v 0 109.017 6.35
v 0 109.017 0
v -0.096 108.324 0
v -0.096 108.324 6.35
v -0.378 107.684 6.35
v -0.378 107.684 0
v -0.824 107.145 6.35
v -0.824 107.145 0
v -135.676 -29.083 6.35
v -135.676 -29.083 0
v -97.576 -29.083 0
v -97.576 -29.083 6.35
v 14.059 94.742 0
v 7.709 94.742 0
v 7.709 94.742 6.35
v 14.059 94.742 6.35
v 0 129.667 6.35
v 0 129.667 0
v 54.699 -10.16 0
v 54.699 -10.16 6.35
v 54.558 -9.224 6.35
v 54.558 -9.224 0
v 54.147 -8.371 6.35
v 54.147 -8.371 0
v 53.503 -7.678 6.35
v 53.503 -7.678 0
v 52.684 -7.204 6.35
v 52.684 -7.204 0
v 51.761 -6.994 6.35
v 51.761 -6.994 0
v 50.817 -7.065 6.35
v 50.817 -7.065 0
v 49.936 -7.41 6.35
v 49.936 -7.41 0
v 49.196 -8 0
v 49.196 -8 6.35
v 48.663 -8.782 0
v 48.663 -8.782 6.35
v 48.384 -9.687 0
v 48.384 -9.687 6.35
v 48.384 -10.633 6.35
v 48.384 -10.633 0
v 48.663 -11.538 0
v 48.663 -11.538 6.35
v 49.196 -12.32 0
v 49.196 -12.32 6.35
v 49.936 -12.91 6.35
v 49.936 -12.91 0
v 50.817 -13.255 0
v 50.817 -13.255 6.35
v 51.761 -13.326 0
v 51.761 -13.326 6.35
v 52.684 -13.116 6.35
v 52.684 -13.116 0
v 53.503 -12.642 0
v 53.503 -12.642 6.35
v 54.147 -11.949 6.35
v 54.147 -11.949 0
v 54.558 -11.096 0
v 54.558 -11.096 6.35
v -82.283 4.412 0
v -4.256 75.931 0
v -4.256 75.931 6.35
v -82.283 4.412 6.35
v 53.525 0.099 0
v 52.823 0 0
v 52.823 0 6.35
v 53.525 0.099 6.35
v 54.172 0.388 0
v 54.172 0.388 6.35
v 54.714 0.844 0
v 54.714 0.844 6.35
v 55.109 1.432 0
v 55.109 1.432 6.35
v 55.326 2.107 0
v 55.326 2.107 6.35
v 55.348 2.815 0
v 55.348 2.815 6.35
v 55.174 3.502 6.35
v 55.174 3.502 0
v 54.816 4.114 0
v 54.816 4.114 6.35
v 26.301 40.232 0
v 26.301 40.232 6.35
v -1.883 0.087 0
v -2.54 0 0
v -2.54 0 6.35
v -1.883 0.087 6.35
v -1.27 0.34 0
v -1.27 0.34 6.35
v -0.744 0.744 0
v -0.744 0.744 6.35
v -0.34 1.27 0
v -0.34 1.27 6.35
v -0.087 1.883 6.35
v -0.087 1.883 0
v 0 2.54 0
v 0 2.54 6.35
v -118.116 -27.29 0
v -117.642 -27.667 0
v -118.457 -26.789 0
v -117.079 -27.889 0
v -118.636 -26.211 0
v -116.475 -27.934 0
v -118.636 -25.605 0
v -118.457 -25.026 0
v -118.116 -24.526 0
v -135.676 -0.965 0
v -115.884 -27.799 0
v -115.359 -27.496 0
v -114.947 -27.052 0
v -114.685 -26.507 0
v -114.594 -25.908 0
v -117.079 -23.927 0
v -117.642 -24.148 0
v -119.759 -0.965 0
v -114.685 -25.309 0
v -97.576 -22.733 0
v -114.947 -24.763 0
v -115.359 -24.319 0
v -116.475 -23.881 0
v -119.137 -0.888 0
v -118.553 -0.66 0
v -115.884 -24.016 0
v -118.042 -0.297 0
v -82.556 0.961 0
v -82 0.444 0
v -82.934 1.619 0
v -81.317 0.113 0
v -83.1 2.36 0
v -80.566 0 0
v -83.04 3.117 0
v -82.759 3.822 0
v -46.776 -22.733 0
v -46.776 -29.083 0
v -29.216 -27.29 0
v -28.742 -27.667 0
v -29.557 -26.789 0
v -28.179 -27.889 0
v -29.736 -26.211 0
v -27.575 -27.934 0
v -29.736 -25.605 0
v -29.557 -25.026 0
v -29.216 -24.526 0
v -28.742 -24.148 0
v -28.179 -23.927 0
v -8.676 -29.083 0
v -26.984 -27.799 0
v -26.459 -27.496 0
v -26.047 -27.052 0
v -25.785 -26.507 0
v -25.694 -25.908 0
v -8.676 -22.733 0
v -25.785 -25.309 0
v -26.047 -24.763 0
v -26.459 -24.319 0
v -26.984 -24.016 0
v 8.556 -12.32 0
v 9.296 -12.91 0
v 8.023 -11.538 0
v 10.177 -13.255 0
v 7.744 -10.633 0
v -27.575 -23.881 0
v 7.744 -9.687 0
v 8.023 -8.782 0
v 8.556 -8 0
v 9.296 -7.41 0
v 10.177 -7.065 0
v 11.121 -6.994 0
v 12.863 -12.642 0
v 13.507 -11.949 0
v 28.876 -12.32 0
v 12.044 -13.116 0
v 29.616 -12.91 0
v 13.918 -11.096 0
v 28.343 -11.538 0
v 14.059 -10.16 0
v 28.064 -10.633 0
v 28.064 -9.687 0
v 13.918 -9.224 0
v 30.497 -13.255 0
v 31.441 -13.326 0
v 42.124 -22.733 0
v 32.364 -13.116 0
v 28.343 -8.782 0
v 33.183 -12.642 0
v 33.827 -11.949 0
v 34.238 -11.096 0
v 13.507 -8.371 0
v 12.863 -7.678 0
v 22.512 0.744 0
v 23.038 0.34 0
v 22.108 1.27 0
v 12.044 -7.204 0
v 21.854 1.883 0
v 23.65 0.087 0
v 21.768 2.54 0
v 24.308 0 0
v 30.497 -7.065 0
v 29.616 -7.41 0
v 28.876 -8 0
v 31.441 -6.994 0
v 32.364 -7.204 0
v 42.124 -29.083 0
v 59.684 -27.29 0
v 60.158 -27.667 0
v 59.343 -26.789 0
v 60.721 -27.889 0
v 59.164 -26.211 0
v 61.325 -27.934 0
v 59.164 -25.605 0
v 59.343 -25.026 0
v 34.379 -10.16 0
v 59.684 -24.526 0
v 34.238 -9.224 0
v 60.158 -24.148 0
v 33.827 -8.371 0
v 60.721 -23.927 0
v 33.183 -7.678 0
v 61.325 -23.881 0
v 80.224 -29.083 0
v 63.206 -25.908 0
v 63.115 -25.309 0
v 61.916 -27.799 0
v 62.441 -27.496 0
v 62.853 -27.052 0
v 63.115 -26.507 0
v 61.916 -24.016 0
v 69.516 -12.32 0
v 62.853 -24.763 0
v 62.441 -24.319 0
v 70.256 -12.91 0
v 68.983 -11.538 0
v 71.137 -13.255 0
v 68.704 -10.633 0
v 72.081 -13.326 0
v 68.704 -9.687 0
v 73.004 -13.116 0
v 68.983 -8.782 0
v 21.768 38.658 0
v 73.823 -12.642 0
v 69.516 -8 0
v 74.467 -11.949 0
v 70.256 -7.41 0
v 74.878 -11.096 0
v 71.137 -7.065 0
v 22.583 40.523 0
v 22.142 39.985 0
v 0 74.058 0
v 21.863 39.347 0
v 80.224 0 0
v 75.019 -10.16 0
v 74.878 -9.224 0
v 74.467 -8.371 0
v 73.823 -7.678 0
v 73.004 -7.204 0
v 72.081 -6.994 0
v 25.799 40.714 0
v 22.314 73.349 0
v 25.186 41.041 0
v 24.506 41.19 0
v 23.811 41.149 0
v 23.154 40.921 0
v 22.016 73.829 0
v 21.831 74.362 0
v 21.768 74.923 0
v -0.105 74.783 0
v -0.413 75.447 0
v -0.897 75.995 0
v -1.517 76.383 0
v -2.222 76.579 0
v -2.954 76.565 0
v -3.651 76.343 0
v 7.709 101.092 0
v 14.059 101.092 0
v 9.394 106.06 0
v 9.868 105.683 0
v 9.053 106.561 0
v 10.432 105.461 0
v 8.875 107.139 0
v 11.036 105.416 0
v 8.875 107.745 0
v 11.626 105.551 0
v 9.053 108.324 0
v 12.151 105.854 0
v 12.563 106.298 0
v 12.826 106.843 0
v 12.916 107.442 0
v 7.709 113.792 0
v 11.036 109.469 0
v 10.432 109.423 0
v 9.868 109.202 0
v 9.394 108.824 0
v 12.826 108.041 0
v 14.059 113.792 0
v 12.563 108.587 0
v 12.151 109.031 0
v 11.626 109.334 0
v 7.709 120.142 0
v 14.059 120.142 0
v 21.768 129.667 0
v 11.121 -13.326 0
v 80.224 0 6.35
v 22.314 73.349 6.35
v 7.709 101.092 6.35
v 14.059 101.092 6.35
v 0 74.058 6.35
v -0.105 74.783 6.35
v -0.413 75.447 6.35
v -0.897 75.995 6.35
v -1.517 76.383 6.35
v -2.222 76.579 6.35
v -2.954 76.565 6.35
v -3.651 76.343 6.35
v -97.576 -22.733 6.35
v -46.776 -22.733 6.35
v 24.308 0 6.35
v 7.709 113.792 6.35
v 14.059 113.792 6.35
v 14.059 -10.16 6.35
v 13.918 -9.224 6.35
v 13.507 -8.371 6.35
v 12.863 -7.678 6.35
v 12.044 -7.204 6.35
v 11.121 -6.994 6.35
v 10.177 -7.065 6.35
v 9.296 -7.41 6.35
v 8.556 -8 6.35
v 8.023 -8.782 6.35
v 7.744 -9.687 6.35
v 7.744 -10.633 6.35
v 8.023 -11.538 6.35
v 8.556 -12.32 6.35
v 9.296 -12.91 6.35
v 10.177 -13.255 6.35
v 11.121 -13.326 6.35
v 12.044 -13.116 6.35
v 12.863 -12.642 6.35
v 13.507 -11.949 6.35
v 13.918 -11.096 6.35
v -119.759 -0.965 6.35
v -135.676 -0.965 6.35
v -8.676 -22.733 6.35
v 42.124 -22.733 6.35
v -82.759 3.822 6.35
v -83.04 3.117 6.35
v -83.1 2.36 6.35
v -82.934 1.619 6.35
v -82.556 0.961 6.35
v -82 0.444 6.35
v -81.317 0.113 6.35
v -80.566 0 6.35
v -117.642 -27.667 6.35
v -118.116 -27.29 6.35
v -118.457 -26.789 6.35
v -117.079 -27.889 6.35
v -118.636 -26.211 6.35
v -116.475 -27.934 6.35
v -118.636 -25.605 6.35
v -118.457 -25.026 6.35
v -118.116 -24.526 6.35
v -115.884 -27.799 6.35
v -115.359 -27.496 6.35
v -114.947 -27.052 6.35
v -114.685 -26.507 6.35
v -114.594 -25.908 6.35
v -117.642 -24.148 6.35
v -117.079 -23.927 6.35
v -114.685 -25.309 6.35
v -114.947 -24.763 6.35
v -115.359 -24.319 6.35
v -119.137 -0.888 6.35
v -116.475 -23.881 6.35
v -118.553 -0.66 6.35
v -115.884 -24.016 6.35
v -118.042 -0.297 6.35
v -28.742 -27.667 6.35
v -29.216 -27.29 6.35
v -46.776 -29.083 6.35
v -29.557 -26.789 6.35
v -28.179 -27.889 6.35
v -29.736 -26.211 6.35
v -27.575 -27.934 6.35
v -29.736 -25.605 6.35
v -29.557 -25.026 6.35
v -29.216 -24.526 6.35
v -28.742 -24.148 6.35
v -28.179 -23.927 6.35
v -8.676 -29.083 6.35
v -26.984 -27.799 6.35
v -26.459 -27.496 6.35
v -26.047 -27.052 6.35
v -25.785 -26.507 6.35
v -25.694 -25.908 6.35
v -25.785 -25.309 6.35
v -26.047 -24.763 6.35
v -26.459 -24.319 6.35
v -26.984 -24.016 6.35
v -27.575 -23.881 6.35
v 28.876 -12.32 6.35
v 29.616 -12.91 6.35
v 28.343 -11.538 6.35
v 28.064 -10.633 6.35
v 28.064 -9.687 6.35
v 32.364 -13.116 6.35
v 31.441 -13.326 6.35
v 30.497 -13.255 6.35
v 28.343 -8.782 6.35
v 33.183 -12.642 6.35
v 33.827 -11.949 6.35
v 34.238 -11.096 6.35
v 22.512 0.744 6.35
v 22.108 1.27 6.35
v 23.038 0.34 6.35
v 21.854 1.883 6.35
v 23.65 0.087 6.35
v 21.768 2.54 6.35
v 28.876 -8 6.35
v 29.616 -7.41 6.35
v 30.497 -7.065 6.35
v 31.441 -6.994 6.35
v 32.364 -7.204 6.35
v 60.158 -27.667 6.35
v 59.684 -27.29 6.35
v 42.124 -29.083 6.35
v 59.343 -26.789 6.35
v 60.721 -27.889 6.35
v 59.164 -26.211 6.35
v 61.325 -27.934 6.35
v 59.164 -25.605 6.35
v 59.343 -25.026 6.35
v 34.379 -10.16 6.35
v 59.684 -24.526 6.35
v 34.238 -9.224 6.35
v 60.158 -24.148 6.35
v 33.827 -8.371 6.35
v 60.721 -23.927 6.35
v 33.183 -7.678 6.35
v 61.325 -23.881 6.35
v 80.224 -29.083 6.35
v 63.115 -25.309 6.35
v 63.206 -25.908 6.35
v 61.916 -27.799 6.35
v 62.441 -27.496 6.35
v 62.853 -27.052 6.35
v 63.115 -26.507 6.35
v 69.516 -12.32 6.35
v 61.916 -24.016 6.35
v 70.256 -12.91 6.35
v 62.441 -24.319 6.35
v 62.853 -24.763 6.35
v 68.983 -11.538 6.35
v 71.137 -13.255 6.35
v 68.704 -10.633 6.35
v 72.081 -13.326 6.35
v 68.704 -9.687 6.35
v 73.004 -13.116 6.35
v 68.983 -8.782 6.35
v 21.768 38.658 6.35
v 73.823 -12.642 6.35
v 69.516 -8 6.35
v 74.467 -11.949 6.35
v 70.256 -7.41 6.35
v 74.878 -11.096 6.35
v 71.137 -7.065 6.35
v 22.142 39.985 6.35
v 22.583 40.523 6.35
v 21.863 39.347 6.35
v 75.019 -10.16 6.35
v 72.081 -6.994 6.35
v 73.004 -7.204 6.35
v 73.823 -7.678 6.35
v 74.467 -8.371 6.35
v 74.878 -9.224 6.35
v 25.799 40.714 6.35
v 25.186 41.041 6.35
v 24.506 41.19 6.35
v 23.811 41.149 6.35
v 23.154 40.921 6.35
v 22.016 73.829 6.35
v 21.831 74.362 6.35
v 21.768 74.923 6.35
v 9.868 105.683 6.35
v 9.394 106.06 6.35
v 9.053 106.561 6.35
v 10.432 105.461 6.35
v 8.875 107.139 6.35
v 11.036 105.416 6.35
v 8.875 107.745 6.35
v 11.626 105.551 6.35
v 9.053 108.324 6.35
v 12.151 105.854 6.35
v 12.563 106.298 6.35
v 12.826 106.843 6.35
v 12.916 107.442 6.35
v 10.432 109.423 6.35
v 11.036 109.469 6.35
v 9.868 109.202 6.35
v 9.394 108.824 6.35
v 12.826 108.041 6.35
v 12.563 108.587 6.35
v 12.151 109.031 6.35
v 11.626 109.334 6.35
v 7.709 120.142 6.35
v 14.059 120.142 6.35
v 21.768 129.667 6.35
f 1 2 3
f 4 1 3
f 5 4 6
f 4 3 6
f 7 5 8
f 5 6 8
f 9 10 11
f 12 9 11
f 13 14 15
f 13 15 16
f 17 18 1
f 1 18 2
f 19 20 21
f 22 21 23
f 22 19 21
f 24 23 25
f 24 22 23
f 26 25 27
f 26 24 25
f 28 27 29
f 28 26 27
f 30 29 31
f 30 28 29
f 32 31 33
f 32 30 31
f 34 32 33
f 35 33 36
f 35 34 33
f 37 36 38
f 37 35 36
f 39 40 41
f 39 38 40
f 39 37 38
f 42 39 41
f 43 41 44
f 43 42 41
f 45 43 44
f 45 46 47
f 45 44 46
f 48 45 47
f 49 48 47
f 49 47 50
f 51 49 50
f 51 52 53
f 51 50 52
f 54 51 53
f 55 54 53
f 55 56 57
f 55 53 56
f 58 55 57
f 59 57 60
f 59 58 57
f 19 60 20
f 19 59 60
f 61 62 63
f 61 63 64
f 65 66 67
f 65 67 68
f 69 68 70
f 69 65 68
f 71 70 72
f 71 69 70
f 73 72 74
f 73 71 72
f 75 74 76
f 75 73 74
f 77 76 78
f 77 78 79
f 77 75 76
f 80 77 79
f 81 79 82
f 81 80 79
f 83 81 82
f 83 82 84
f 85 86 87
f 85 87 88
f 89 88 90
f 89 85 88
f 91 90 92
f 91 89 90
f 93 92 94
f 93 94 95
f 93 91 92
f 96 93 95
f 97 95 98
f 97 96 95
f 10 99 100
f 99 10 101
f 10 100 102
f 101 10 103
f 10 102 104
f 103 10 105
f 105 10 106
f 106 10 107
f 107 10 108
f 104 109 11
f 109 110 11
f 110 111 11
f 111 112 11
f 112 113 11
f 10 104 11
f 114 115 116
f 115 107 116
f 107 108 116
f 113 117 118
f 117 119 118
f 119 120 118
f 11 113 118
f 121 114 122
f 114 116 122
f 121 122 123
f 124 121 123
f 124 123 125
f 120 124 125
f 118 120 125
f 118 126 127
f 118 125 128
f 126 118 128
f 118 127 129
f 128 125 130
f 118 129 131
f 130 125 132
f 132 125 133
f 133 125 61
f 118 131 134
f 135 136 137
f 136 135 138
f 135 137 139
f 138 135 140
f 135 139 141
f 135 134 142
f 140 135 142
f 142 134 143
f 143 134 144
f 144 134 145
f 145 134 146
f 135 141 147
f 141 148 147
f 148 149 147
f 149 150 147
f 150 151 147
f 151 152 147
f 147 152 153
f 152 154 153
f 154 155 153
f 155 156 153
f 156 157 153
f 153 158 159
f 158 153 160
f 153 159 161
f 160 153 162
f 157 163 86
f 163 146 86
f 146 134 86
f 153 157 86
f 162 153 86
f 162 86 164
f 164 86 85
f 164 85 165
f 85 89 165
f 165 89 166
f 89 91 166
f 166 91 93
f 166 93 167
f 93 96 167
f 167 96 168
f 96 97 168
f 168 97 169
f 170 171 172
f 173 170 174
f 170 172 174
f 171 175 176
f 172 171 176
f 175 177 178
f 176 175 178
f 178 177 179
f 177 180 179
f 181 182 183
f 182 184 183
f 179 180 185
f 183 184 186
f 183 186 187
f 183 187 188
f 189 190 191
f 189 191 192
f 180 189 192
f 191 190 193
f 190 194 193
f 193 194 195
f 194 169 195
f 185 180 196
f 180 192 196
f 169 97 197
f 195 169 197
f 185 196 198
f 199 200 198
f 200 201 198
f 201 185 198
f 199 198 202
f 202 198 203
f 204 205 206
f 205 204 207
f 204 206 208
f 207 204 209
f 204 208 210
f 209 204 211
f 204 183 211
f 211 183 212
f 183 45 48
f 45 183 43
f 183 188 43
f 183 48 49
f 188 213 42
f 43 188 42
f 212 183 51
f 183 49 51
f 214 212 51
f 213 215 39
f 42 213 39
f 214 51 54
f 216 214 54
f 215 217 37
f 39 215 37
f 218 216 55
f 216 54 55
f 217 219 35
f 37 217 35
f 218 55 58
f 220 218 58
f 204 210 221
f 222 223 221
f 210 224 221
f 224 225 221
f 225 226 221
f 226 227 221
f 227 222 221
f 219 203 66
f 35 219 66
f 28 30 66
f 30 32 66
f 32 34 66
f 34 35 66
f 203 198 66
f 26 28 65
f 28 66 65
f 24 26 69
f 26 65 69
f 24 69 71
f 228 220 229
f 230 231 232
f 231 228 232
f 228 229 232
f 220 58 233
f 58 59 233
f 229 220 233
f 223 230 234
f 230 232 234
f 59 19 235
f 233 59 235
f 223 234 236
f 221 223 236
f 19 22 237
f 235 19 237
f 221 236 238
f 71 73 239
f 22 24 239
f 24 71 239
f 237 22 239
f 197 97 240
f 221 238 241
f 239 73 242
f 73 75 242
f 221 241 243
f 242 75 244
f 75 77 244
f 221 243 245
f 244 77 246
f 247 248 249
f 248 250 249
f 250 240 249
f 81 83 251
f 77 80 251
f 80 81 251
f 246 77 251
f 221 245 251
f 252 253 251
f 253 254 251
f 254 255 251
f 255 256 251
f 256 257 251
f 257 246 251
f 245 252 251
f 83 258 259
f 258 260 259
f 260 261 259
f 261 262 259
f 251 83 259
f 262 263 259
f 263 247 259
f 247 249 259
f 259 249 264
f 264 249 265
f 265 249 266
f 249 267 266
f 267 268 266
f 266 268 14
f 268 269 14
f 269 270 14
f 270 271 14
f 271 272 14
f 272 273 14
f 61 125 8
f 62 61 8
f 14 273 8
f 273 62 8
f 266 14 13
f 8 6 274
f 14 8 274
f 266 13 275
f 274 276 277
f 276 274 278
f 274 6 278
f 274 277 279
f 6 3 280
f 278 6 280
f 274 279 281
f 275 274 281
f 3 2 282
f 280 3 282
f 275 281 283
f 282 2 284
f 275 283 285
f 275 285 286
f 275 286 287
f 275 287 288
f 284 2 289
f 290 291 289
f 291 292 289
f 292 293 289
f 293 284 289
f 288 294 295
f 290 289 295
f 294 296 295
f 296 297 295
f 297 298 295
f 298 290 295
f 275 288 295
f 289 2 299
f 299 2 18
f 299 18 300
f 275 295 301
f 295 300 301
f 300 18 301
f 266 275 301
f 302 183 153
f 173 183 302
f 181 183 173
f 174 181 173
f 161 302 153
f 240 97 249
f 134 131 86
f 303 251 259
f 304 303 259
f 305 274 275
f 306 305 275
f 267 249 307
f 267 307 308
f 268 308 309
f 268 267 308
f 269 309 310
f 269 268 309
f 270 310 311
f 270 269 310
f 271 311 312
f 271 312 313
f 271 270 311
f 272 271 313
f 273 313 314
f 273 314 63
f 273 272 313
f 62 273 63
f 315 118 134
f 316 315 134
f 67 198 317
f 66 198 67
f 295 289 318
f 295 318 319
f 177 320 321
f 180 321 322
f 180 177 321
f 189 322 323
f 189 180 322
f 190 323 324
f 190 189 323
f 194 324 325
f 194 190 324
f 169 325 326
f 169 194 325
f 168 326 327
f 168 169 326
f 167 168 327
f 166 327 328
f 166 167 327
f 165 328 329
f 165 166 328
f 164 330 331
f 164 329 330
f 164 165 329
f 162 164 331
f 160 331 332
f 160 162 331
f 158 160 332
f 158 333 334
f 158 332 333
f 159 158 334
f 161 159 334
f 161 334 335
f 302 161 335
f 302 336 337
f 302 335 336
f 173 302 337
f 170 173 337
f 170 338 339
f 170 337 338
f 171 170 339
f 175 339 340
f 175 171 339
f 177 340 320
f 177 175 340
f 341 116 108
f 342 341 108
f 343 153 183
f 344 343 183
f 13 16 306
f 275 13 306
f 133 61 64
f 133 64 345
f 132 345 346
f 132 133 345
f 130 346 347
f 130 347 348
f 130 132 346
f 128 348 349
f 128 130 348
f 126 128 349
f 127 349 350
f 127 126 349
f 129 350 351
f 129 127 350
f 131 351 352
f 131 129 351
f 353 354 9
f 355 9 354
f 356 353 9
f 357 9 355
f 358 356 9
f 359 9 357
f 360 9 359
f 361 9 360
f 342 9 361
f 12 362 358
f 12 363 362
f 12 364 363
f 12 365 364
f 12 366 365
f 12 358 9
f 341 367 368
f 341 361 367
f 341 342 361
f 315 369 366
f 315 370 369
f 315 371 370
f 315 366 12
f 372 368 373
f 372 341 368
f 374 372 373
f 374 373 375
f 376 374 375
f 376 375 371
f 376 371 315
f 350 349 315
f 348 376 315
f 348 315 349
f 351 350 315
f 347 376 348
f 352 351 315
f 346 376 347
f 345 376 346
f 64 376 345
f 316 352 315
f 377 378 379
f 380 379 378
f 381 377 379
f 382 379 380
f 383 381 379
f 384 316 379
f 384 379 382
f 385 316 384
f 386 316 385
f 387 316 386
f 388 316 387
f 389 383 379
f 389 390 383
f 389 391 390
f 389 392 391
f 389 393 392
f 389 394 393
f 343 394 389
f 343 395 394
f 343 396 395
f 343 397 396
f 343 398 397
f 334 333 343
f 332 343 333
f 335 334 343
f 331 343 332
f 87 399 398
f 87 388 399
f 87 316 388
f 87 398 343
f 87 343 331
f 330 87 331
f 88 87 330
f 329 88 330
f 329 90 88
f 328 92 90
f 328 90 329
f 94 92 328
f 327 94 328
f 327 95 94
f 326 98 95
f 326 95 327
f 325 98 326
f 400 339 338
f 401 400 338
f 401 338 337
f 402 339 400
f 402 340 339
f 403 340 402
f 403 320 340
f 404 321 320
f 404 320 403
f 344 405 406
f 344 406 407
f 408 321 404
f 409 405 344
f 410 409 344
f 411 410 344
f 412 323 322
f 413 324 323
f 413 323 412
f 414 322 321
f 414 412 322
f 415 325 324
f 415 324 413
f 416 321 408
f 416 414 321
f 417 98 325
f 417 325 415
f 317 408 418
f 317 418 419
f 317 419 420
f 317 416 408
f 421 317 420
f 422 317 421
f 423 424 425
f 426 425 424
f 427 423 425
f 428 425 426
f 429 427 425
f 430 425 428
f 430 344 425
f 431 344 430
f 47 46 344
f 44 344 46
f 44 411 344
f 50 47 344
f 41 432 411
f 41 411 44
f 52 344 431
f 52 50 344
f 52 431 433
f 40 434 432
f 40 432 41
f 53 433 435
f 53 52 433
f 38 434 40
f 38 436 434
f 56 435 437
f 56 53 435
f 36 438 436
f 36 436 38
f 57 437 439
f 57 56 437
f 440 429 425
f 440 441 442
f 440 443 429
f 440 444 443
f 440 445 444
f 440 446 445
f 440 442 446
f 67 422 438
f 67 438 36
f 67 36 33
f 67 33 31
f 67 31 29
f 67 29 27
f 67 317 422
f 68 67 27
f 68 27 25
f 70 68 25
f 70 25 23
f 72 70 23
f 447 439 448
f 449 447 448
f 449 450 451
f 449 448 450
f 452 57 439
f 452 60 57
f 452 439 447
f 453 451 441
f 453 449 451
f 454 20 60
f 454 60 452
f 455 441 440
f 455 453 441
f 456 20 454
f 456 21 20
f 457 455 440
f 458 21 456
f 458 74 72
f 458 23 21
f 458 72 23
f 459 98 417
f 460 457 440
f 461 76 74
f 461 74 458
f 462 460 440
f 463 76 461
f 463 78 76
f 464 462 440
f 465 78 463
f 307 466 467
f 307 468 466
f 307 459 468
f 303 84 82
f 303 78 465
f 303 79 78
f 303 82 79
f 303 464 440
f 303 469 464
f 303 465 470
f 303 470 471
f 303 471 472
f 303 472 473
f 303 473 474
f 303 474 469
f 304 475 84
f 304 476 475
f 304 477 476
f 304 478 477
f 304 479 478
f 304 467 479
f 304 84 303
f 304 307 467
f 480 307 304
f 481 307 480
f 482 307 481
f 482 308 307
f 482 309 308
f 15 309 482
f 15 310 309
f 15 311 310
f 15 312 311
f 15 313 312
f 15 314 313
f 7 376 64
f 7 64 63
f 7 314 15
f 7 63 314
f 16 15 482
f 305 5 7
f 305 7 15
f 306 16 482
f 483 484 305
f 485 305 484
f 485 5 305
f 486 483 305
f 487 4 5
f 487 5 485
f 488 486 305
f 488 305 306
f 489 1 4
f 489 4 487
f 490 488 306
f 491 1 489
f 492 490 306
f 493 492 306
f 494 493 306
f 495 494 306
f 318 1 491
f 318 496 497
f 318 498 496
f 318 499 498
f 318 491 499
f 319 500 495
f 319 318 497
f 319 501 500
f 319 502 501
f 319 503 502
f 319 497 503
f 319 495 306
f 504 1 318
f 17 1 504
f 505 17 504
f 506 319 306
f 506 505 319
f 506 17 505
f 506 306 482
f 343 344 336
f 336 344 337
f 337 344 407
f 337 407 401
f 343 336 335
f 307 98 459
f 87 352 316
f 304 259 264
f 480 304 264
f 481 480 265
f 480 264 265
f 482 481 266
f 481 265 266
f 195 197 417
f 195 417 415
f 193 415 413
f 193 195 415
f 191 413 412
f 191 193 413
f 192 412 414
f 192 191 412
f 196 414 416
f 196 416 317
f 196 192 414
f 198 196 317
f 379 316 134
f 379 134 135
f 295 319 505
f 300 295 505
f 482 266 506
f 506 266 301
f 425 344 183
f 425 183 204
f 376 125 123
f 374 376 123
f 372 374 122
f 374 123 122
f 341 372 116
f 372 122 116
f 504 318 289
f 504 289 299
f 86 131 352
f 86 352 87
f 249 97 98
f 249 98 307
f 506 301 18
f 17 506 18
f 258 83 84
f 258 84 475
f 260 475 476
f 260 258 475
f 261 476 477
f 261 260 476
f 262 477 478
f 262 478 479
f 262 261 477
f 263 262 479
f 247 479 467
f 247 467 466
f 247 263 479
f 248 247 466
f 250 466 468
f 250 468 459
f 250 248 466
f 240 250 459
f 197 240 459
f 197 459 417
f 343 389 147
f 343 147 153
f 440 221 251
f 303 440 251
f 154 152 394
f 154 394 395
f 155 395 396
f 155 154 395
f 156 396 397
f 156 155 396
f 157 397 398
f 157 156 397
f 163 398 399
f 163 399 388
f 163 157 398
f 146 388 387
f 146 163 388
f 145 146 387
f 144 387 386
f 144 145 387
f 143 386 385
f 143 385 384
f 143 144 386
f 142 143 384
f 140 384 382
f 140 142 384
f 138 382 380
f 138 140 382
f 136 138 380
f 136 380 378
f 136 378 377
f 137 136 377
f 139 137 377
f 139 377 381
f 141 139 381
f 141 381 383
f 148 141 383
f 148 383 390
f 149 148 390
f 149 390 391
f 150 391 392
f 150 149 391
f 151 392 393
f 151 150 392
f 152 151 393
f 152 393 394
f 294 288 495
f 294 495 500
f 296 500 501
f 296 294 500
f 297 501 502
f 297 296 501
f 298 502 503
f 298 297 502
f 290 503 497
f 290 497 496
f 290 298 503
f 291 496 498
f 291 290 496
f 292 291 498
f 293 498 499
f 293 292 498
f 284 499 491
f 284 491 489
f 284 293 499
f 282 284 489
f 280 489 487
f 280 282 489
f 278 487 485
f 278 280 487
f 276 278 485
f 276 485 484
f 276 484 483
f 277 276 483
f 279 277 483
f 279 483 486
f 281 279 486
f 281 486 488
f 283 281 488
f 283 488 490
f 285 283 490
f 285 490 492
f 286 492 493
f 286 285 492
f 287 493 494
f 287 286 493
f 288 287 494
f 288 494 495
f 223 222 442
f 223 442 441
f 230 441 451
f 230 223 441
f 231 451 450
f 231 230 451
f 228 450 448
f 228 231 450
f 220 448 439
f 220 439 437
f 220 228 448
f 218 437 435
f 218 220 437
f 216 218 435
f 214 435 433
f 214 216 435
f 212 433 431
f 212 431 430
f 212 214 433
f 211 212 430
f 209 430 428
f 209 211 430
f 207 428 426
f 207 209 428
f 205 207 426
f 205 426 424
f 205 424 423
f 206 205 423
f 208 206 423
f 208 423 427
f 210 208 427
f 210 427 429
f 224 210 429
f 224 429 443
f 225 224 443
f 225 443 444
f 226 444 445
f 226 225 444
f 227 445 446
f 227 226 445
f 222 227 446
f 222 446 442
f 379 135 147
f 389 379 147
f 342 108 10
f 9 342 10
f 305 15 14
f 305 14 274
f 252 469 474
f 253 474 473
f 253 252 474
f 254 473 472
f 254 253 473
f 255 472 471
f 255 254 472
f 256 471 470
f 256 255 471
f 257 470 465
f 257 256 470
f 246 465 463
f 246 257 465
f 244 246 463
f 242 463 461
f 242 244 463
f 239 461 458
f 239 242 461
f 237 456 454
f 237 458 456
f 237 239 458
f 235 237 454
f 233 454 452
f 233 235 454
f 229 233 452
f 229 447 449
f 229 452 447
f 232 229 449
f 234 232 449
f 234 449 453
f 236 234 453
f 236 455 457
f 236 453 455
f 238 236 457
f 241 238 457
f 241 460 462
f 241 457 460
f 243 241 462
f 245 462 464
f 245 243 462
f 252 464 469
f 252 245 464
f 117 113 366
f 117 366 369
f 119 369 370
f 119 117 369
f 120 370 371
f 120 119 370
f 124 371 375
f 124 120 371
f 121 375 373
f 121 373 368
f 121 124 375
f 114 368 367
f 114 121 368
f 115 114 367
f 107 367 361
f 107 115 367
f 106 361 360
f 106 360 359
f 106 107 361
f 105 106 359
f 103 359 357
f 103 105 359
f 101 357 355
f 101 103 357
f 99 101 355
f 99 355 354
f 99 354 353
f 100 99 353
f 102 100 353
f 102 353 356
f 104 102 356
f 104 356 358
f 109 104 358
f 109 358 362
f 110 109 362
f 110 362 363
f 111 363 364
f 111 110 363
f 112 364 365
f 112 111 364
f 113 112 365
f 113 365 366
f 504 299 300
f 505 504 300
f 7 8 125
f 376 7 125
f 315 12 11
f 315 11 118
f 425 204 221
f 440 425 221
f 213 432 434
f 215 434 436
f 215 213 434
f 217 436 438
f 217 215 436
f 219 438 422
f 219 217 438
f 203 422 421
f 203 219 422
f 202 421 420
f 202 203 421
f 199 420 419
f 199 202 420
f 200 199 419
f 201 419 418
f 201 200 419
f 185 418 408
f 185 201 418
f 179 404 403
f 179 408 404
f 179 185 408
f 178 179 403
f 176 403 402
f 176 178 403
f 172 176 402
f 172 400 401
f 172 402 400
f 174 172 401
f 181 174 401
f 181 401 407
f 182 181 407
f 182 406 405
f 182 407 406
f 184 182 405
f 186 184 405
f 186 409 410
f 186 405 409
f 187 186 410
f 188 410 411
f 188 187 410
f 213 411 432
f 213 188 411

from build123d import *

# Parameters (mm, degrees)
SKETCH1_R           = 2.032
SKETCH1_W           = 6.35
SKETCH1_H           = 6.35
BOSS_EXTRUDE2_DEPTH = 6.35
CUT_EXTRUDE1_START  = -6.35
SKETCH3_R           = 3.175
CUT_EXTRUDE1_DEPTH  = 195.131829617


with BuildPart() as part:
    # Sketch1 → Boss-Extrude2 (new body)
    with BuildSketch(Plane.XY):
        with BuildLine():
            Line((21.7678, 129.667339502), (0, 129.667339502))
            Line((0, 129.667339502), (0, 109.016949915))
            ThreePointArc((0, 109.016949915), (-0.215035851, 107.994139226), (-0.823733627, 107.1445104))
            Line((-0.823733627, 107.1445104), (-118.042304389, -0.297300013))
            ThreePointArc((-118.042304389, -0.297300013), (-118.837809221, -0.792094788), (-119.758570763, -0.964860498))
            Line((-119.758570763, -0.964860498), (-135.676357929, -0.964860498))
            Line((-135.676357929, -0.964860498), (-135.676357929, -29.082660498))
            Line((-135.676357929, -29.082660498), (-97.576357929, -29.082660498))
            Line((-97.576357929, -29.082660498), (-97.576357929, -22.732660498))
            Line((-97.576357929, -22.732660498), (-46.776357929, -22.732660498))
            Line((-46.776357929, -22.732660498), (-46.776357929, -29.082660498))
            Line((-46.776357929, -29.082660498), (-8.676357929, -29.082660498))
            Line((-8.676357929, -29.082660498), (-8.676357929, -22.732660498))
            Line((-8.676357929, -22.732660498), (42.123642071, -22.732660498))
            Line((42.123642071, -22.732660498), (42.123642071, -29.082660498))
            Line((42.123642071, -29.082660498), (80.223642071, -29.082660498))
            Line((80.223642071, -29.082660498), (80.223642071, 0))
            Line((80.223642071, 0), (22.314225969, 73.349225433))
            ThreePointArc((22.314225969, 73.349225433), (21.908291921, 74.090114432), (21.7678, 74.923157637))
            Line((21.7678, 74.923157637), (21.7678, 129.667339502))
        make_face()
        with Locations((-116.626357929, -25.907660498)):
            Circle(SKETCH1_R, mode=Mode.SUBTRACT)
        with Locations((-27.726357929, -25.907660498)):
            Circle(SKETCH1_R, mode=Mode.SUBTRACT)
        with Locations((61.173642071, -25.907660498)):
            Circle(SKETCH1_R, mode=Mode.SUBTRACT)
        with Locations((10.8839, 107.442339502)):
            Circle(SKETCH1_R, mode=Mode.SUBTRACT)
        with BuildLine():
            Line((24.3078, 0), (52.822865129, 0))
            ThreePointArc((52.822865129, 0), (55.108624062, 1.432342065), (54.81643916, 4.113932204))
            Line((54.81643916, 4.113932204), (26.301374031, 40.231684398))
            ThreePointArc((26.301374031, 40.231684398), (23.474756795, 41.057260272), (21.7678, 38.657752193))
            Line((21.7678, 38.657752193), (21.7678, 2.54))
            ThreePointArc((21.7678, 2.54), (22.511748776, 0.743948776), (24.3078, 0))
        make_face(mode=Mode.SUBTRACT)
        with BuildLine():
            Line((0, 2.54), (0, 74.05849329))
            ThreePointArc((0, 74.05849329), (-1.517189311, 76.38345744), (-4.256266373, 75.930932805))
            Line((-4.256266373, 75.930932805), (-82.28264674, 4.412439515))
            ThreePointArc((-82.28264674, 4.412439515), (-82.933614657, 1.619238458), (-80.566380367, 0))
            Line((-80.566380367, 0), (-2.54, 0))
            ThreePointArc((-2.54, 0), (-0.743948776, 0.743948776), (0, 2.54))
        make_face(mode=Mode.SUBTRACT)
        with Locations((10.8839, 116.967339502)):
            Rectangle(SKETCH1_W, SKETCH1_H, mode=Mode.SUBTRACT)
        with Locations((10.8839, 97.917339502)):
            Rectangle(SKETCH1_W, SKETCH1_H, mode=Mode.SUBTRACT)
    extrude(amount=BOSS_EXTRUDE2_DEPTH)

    # Sketch3 → Cut-Extrude1 (cut, through all)
    with BuildSketch(Plane.XY.offset(6.35).offset(CUT_EXTRUDE1_START)):
        with Locations((10.8839, -10.16)):
            Circle(SKETCH3_R)
        with Locations((31.2039, -10.16)):
            Circle(SKETCH3_R)
        with Locations((51.5239, -10.16)):
            Circle(SKETCH3_R)
        with Locations((71.8439, -10.16)):
            Circle(SKETCH3_R)
    extrude(amount=CUT_EXTRUDE1_DEPTH, mode=Mode.SUBTRACT)


solid = part.part
